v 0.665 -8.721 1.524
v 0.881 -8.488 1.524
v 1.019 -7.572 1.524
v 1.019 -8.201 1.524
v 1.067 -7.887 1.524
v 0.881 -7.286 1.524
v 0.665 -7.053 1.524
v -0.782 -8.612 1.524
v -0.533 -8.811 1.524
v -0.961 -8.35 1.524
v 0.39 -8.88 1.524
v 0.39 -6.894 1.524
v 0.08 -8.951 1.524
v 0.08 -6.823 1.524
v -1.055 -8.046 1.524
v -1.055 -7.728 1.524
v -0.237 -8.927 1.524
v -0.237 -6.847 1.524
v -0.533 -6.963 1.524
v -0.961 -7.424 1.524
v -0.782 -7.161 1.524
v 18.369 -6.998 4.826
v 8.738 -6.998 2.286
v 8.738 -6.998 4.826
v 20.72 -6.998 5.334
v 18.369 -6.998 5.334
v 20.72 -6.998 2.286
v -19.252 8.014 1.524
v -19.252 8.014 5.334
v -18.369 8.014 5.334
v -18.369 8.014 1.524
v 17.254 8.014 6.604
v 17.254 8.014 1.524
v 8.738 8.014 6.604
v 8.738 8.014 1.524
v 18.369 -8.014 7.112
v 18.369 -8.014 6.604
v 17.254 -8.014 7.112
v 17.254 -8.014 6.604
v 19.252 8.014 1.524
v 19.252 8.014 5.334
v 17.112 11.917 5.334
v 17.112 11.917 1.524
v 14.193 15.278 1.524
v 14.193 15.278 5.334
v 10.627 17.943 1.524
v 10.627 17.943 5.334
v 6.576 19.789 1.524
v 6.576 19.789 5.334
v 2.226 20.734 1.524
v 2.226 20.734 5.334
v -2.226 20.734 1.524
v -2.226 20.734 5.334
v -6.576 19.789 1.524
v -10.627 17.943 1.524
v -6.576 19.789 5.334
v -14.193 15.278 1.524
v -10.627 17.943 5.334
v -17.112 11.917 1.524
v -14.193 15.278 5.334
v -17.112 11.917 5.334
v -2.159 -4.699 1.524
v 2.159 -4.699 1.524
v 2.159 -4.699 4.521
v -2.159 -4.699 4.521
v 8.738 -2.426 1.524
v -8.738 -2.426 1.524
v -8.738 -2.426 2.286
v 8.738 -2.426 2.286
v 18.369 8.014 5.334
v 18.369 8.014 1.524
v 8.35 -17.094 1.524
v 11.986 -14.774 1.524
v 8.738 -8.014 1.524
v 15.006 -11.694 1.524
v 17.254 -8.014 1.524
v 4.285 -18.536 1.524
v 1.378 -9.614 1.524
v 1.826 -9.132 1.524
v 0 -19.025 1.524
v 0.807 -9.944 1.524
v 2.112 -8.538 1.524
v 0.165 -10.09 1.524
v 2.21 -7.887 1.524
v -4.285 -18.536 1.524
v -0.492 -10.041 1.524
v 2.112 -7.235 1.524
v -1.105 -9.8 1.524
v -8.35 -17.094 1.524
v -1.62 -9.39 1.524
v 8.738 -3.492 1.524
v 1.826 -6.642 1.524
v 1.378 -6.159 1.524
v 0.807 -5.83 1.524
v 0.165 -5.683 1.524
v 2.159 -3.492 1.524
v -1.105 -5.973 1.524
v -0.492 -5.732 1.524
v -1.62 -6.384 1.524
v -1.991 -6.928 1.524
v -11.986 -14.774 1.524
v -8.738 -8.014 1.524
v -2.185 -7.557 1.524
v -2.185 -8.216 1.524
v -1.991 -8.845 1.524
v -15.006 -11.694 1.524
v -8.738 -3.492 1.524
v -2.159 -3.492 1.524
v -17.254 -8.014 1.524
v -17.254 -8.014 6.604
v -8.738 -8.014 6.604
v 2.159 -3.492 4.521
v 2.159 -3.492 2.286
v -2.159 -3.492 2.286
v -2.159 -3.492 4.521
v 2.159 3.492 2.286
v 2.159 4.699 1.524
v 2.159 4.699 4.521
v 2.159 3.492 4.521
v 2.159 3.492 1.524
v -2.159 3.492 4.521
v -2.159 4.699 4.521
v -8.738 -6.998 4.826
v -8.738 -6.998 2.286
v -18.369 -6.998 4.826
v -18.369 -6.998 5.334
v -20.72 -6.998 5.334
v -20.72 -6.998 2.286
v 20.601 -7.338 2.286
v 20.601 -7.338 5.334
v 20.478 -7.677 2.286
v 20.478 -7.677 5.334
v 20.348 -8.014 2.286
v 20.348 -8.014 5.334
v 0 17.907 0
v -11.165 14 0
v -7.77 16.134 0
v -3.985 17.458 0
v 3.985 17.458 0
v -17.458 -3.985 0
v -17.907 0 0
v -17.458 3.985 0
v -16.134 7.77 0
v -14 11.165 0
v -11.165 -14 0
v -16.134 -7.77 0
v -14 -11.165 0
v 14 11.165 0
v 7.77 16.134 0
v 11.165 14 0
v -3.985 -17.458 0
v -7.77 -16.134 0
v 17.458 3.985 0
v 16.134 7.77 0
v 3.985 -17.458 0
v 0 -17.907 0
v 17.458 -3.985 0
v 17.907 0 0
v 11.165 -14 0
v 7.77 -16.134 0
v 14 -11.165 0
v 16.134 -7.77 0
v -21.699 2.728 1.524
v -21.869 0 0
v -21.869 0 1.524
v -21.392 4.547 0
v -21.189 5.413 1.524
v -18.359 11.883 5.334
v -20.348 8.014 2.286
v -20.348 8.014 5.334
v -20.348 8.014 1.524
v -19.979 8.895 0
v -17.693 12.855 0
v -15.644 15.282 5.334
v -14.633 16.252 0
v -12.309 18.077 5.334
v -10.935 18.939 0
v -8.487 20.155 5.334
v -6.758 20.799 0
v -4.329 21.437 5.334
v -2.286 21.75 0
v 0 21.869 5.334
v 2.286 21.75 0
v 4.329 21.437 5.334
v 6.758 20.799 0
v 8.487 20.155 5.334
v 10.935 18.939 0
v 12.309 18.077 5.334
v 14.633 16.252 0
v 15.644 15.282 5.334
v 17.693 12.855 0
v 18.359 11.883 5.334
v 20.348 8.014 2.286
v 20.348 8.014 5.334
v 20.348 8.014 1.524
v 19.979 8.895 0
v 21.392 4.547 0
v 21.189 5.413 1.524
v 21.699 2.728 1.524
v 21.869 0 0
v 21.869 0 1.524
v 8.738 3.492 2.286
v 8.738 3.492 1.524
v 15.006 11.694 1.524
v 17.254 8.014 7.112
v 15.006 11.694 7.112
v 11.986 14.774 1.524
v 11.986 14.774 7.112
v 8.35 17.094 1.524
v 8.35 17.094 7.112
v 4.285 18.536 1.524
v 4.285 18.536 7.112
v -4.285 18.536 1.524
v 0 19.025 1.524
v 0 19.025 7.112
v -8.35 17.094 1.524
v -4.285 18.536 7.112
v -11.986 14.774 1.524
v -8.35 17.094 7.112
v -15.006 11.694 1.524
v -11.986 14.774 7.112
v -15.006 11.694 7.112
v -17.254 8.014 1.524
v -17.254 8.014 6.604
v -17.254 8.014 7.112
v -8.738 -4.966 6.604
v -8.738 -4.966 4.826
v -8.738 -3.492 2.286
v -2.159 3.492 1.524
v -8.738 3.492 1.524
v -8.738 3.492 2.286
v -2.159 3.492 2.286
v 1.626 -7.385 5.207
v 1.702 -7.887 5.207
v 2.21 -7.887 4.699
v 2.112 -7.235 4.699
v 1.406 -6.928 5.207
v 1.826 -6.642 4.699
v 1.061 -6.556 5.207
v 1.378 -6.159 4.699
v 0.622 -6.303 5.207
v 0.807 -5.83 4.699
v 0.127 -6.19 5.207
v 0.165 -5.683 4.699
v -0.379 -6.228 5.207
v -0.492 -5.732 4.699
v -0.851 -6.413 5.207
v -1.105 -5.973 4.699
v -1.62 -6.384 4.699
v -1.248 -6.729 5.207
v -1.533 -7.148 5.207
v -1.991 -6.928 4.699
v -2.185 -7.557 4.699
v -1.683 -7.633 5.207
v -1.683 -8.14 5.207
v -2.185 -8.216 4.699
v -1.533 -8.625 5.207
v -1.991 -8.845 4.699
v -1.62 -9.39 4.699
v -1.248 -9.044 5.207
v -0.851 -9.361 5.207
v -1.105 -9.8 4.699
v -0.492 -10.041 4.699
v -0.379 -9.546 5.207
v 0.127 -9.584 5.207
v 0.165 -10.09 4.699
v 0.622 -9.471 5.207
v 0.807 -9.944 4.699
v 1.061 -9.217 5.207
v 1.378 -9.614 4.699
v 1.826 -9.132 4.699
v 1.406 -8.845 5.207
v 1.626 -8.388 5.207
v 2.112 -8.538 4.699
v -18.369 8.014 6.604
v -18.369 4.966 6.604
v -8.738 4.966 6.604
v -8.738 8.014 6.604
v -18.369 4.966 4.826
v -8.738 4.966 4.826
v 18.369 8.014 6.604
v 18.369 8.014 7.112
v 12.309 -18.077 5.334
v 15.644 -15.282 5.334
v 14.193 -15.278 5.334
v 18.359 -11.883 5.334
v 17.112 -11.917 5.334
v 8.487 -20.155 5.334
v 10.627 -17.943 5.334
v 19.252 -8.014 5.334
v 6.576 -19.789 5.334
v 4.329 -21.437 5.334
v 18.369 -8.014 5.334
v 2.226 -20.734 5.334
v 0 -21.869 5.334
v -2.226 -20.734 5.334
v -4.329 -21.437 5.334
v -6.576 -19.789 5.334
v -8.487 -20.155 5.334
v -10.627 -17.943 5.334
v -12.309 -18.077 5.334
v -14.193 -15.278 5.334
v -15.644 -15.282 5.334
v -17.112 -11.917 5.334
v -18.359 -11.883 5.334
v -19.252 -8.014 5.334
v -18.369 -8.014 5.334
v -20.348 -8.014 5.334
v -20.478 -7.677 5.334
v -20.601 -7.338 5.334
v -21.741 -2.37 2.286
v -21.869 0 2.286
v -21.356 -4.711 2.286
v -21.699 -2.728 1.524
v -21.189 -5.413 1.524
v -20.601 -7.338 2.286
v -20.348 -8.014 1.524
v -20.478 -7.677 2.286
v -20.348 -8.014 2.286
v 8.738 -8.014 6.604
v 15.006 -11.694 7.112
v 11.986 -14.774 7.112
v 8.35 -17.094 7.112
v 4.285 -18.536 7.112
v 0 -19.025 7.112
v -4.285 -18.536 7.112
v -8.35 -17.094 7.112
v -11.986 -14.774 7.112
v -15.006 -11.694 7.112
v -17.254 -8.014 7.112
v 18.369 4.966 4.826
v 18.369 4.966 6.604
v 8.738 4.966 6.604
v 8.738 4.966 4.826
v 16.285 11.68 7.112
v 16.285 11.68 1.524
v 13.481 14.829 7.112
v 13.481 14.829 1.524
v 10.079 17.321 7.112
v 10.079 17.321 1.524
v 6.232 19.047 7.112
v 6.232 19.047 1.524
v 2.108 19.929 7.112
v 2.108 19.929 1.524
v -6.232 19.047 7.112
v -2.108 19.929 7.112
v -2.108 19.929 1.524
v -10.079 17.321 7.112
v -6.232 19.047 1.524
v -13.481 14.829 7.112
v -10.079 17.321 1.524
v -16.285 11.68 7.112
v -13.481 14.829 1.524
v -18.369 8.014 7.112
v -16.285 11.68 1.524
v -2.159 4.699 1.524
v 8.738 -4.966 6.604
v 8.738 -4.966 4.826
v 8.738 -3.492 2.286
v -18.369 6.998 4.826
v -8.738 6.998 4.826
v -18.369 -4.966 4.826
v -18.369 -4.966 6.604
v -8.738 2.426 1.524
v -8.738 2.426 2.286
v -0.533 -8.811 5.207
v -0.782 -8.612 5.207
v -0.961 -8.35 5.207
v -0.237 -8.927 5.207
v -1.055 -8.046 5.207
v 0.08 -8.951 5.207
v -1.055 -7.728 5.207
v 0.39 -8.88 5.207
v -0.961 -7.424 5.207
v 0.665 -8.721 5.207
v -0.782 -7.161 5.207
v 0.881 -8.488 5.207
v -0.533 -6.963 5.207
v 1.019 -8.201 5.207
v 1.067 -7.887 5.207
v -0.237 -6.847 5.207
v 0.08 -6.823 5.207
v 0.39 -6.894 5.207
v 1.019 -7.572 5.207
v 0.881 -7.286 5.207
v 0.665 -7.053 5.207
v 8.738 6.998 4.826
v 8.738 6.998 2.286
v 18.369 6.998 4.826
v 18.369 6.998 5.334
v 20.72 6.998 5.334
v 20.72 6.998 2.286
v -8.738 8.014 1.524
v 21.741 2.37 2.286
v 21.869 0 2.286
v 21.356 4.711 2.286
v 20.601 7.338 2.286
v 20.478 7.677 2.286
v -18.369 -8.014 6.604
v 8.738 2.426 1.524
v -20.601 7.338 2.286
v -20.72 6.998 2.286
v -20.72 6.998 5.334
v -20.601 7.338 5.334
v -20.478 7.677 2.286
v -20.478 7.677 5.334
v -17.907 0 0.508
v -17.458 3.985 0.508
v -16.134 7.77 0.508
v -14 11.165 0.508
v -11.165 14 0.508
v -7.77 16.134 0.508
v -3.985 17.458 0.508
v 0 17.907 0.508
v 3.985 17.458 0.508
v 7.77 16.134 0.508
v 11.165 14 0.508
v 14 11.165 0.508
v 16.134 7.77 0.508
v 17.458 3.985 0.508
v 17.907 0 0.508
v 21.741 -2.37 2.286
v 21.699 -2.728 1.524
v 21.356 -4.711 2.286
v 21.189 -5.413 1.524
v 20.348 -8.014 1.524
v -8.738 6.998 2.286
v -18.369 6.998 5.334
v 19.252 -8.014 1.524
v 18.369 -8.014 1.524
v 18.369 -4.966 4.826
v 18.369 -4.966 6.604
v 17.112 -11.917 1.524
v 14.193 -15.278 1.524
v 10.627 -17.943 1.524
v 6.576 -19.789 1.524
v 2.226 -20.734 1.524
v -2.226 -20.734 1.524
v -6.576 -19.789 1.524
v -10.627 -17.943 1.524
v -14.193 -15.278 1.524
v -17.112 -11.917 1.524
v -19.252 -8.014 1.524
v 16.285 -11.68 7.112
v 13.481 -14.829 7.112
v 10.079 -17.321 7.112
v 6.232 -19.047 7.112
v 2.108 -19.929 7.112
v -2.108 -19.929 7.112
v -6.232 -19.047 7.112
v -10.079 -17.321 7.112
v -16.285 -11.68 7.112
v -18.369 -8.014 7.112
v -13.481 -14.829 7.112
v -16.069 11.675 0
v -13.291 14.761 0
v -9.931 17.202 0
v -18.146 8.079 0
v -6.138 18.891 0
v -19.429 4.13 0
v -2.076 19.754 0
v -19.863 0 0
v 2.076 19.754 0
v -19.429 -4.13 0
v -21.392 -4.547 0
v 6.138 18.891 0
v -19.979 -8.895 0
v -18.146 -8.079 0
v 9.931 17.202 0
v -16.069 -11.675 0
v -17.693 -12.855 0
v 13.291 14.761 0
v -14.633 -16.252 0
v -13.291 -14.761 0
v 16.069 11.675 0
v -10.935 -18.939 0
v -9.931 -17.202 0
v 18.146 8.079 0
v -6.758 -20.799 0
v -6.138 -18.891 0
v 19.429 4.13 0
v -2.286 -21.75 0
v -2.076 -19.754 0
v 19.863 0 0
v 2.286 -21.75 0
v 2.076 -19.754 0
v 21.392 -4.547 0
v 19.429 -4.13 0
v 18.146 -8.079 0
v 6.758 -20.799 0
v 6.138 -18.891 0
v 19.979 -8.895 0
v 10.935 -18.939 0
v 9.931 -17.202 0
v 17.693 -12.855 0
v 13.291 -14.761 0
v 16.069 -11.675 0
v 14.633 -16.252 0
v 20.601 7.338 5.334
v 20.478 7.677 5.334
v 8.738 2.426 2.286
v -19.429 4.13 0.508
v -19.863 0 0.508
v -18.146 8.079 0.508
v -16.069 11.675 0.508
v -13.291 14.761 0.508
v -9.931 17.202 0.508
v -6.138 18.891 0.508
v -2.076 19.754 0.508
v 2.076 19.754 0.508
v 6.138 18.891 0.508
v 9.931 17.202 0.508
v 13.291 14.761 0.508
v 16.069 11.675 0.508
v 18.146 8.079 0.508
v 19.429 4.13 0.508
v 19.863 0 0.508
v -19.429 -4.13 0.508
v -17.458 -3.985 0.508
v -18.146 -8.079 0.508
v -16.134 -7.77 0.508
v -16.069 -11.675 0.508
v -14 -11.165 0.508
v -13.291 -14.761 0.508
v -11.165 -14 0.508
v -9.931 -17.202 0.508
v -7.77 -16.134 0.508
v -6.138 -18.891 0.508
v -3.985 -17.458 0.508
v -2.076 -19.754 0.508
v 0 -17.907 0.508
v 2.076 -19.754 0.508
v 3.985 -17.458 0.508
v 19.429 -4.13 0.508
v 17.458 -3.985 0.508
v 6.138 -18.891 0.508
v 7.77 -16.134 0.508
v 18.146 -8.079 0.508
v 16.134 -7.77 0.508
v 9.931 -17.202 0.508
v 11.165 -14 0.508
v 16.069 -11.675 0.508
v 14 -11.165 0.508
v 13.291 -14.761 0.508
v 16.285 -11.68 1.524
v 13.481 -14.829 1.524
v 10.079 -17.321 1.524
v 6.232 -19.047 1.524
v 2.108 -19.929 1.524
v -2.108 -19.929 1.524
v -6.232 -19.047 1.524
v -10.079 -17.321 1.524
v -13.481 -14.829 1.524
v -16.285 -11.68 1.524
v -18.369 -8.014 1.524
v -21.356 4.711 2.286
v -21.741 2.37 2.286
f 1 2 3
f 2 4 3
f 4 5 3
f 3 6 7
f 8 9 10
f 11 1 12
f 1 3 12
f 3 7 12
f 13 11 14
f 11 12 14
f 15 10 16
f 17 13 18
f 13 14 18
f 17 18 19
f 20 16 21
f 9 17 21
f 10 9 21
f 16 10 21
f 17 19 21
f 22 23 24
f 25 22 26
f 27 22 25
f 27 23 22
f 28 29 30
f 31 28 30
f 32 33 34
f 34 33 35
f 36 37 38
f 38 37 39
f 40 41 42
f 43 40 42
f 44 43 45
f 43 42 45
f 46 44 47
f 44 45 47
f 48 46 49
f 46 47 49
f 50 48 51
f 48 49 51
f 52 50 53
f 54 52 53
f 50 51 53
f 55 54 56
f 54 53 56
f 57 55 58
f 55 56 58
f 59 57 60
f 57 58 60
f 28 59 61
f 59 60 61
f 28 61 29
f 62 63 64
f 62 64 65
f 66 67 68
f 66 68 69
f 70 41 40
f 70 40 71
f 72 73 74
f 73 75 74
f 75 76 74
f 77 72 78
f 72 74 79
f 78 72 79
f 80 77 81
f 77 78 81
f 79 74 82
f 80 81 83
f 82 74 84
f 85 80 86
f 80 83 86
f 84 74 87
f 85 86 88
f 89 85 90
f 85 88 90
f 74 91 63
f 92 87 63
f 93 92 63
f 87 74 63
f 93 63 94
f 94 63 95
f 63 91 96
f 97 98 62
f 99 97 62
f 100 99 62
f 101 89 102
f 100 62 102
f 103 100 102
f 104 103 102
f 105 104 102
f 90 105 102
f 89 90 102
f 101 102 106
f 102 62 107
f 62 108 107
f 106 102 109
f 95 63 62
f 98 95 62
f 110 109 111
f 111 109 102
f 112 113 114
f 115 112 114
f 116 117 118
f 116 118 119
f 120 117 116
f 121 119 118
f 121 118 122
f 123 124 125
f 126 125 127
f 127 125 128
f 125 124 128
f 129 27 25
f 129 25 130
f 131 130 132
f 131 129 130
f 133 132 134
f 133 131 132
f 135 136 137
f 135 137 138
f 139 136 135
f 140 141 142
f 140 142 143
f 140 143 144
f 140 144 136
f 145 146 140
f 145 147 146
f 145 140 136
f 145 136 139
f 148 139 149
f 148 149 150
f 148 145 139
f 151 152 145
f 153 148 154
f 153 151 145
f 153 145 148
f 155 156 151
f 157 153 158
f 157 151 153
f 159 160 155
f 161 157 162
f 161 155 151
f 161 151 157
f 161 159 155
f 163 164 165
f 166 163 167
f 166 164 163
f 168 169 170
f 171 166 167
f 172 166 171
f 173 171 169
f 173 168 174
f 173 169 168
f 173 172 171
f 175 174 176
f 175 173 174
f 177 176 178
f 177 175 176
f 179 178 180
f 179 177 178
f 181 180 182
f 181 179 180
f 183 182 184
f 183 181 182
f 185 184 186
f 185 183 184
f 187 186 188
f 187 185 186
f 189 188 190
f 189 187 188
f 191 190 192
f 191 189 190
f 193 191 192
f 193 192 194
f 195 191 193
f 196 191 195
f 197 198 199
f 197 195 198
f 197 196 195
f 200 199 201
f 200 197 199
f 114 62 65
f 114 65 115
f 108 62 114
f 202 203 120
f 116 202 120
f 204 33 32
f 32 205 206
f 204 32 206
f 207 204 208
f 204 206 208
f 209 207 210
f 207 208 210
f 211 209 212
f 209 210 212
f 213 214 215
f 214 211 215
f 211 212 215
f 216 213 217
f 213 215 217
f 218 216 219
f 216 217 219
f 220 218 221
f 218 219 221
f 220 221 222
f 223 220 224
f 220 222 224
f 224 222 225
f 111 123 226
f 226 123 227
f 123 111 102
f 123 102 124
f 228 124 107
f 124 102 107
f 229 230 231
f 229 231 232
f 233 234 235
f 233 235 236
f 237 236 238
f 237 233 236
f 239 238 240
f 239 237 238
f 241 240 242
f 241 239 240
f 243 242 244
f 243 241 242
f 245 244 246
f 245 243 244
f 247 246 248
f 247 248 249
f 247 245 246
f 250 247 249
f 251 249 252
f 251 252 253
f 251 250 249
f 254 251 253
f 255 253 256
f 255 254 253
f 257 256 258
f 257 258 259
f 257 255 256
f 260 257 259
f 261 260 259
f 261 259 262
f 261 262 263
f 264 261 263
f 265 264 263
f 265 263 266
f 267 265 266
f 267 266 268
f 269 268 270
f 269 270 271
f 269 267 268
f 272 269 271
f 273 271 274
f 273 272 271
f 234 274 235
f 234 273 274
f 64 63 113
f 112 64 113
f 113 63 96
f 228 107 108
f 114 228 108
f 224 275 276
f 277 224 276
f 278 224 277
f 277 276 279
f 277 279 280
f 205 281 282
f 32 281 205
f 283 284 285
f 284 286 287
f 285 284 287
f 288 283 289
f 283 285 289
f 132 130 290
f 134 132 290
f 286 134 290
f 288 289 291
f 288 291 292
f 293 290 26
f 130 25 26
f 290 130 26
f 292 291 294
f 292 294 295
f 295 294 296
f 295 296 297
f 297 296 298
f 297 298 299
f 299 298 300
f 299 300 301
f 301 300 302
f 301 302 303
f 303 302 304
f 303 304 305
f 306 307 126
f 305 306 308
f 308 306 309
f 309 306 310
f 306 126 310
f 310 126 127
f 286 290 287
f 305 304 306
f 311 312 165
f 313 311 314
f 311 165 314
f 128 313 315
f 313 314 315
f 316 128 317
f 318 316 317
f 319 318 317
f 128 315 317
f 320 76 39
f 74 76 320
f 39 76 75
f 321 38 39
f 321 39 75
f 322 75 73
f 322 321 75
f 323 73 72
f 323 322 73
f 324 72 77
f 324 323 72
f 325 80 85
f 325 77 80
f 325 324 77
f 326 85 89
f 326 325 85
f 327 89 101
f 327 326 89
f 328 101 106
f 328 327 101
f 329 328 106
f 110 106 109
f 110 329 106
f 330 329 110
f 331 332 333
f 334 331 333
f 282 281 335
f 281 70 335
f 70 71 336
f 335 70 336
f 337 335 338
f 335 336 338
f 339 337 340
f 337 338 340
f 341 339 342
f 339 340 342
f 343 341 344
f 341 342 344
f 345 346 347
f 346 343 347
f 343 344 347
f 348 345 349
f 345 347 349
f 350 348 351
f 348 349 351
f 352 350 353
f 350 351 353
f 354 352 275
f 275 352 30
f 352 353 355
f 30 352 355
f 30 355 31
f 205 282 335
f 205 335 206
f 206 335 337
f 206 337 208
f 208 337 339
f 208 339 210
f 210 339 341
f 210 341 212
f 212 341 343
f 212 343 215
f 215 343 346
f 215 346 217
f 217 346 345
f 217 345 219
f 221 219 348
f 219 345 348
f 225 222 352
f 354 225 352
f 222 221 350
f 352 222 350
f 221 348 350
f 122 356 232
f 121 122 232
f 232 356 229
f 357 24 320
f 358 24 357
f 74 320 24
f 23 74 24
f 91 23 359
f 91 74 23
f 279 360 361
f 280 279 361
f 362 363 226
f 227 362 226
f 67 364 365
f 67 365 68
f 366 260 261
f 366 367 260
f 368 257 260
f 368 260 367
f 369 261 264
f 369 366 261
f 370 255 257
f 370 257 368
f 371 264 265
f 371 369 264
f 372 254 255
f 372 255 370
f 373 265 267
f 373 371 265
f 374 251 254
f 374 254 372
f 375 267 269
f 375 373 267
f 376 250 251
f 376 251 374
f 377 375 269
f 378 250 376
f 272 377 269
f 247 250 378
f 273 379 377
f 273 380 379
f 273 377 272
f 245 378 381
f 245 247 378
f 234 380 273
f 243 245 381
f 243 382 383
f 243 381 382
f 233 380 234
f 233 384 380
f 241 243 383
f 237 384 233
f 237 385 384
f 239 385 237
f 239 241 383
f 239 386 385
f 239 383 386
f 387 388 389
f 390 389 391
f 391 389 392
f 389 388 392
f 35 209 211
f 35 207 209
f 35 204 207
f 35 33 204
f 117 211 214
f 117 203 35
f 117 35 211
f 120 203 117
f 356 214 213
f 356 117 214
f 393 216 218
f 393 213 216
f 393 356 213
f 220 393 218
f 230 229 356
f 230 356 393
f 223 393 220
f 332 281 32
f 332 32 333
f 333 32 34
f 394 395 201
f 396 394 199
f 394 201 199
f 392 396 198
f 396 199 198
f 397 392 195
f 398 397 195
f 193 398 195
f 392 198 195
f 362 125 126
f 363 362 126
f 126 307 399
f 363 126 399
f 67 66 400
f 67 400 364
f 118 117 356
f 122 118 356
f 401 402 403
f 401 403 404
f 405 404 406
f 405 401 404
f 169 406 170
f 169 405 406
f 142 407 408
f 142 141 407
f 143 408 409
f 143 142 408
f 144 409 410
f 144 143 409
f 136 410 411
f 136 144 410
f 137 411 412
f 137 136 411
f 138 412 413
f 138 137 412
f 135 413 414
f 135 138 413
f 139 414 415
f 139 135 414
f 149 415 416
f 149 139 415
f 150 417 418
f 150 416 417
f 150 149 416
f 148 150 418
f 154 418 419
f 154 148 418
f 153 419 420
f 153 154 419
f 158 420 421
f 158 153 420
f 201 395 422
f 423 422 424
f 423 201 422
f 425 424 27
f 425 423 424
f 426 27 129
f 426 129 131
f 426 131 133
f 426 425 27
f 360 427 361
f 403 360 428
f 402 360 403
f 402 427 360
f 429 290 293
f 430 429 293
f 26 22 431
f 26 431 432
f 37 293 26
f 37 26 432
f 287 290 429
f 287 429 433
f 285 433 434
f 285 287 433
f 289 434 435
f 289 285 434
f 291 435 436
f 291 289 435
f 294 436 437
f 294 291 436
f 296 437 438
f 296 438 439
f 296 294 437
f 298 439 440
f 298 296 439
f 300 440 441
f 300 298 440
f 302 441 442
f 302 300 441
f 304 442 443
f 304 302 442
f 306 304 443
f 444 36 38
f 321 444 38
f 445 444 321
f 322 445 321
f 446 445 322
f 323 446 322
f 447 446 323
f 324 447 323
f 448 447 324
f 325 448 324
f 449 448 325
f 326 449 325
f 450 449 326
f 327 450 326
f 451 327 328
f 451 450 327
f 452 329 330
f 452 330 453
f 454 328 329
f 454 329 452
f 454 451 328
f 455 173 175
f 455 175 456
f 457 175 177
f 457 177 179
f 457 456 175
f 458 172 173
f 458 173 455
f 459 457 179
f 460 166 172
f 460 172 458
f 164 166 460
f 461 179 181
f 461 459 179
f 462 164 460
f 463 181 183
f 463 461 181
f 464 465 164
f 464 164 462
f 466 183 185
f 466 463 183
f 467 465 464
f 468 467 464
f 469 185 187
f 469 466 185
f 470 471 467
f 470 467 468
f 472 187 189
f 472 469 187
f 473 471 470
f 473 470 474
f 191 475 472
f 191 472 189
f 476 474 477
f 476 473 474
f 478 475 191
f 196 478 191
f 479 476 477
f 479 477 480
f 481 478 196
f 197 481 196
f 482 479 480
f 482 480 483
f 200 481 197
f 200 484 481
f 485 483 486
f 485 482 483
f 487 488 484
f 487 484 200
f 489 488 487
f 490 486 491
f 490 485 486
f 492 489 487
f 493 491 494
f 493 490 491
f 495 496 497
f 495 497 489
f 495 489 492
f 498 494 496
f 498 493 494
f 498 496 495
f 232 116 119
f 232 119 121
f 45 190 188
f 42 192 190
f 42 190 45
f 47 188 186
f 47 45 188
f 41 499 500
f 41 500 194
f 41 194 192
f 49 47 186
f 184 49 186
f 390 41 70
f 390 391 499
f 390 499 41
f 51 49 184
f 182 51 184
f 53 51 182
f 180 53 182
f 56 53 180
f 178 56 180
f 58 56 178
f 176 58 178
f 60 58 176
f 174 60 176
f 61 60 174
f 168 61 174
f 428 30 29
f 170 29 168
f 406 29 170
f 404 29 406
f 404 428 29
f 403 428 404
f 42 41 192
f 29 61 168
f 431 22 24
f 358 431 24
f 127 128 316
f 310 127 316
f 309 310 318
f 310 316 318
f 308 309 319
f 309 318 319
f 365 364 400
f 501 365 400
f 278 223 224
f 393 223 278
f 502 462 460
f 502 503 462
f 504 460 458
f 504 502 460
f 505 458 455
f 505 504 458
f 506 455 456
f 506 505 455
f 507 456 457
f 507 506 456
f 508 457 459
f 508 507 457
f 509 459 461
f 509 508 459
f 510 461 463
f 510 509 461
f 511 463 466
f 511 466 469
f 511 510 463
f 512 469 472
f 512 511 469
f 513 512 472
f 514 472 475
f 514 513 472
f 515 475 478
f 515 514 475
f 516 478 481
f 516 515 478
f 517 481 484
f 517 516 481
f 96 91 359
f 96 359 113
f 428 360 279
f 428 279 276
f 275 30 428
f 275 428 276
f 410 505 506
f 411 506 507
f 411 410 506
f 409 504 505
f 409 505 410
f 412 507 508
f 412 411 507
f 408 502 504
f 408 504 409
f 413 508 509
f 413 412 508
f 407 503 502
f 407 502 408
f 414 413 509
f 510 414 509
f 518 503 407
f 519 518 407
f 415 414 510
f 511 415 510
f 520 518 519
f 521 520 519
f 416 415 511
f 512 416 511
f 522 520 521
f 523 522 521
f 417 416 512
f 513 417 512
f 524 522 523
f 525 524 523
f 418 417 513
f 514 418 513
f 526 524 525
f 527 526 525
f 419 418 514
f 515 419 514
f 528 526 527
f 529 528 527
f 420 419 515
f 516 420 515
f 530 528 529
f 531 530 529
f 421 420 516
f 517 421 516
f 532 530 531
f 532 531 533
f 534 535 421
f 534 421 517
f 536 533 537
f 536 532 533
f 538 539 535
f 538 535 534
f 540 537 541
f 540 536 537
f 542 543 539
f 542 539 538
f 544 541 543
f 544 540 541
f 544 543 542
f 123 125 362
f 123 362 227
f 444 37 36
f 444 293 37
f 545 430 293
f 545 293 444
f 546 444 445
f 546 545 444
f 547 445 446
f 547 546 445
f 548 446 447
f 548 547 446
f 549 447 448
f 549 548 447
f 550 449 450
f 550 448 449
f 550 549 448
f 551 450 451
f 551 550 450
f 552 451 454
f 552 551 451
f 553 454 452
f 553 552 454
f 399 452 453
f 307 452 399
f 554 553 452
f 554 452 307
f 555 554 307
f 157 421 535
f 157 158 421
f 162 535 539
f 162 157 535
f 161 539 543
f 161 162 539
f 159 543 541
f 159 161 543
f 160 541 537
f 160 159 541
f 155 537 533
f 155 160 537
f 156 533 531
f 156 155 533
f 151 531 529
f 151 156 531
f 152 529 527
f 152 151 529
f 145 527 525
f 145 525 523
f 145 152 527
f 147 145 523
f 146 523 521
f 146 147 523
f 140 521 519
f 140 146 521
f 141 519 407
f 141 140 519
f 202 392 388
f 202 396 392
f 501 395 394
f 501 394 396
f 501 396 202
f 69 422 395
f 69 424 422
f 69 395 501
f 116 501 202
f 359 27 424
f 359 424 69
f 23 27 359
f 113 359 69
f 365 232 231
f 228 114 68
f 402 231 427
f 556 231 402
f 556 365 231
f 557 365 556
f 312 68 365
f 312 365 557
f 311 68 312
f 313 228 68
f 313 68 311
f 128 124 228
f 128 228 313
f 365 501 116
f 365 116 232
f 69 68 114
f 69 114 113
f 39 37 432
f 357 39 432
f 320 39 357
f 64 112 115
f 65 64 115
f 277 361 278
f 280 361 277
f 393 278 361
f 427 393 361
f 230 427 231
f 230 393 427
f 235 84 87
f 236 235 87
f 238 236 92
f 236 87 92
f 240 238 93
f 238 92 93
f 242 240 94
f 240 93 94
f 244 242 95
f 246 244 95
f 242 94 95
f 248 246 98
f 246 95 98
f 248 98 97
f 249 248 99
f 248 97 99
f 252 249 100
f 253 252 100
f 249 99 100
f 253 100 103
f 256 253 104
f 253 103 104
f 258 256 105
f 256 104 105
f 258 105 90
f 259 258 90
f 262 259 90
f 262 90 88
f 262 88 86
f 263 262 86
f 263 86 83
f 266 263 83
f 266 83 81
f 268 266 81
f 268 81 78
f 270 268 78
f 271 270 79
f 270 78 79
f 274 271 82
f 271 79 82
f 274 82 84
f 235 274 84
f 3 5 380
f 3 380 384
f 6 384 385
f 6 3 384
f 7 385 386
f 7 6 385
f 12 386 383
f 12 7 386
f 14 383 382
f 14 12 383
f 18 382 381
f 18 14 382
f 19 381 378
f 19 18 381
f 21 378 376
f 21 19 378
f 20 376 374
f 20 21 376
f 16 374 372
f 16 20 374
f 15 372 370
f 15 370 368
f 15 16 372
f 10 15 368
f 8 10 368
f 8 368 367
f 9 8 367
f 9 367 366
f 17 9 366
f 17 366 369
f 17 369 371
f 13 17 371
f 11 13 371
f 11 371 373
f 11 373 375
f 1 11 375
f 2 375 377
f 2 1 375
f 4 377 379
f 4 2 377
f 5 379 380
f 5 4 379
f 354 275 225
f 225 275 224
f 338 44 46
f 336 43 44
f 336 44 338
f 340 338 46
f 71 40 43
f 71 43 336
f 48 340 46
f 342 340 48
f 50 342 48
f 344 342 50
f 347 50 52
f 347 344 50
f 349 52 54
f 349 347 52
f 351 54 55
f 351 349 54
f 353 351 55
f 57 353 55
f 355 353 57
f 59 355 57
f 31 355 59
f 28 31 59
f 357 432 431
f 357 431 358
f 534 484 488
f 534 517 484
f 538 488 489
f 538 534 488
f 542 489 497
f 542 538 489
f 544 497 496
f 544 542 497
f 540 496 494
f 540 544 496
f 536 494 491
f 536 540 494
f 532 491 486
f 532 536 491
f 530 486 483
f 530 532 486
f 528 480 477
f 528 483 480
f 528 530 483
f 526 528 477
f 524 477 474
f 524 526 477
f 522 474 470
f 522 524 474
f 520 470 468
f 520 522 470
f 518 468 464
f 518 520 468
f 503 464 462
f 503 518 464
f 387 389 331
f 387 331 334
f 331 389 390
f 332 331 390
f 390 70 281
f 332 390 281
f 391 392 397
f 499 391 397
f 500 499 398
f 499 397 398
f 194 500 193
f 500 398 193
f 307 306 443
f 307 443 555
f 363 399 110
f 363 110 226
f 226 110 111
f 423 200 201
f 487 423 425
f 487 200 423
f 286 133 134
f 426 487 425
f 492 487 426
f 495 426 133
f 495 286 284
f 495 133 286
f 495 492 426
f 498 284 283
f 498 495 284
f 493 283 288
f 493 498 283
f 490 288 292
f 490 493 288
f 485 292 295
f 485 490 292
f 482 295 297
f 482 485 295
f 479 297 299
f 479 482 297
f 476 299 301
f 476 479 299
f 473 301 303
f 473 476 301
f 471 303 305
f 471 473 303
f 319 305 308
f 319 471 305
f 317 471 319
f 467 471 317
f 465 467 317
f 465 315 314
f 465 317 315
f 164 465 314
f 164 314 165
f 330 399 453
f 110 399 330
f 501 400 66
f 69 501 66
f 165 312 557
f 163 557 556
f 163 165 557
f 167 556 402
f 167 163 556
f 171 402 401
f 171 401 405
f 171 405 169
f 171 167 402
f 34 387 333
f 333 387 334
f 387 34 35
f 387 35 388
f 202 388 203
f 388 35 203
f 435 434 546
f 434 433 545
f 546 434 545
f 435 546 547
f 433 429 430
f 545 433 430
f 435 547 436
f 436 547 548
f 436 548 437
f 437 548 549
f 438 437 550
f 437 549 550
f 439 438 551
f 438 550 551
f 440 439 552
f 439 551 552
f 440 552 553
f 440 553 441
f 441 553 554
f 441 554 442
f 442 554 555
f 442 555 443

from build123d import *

# Parameters (mm, degrees)
F1_ANGLE  = 90
F3_DEPTH  = 25.4
F4_DEPTH  = 0.762
F6_DEPTH  = 3.048
F7_W      = 9.631022
F7_H      = 1.778
F8_DEPTH  = 3.048
F9_W      = 2.159
F9_H      = 1.2065
F10_DEPTH = 2.9972
F13_R     = 2.2098
F13_R_2   = 1.0668
F14_DEPTH = 3.683
F15_SIZE  = 0.508


with BuildPart() as f1:
    # F0 (on Front) → F1 (revolve)
    with BuildSketch(Plane.XZ):
        Polygon((-17.907, 0), (0, 0), (0, 1.524), (-19.0246, 1.524), (-19.0246, 7.112), (-20.0406, 7.112), (-20.0406, 1.524), (-20.8534, 1.524), (-20.8534, 5.334), (-21.8694, 5.334), (-21.8694, 0), (-19.8628, 0), (-19.8628, 0.508), (-17.907, 0.508), align=None)
    revolve(axis=Axis((0, 0, 5.251978), (0, 0, 1)), revolution_arc=F1_ANGLE)

    # F2 (on face) → F3 (cut)
    with BuildSketch(Plane.XY.offset(1.524)):
        with BuildLine():
            Line((0, -3.4925), (0, -2.4257))
            Line((0, -2.4257), (-8.7376, -2.4257))
            Line((-8.7376, -2.4257), (-8.7376, 0))
            Line((-8.7376, 0), (-21.8694, 0))
            ThreePointArc((-21.8694, 0), (-21.485747, -4.078397), (-20.34825, -8.0137))
            Line((-20.34825, -8.0137), (-8.7376, -8.0137))
            Line((-8.7376, -8.0137), (-8.7376, -3.4925))
            Line((-8.7376, -3.4925), (0, -3.4925))
        make_face()
    extrude(amount=F3_DEPTH, mode=Mode.SUBTRACT)

    # F2 (on face) → F4 (join)
    with BuildSketch(Plane.XY.offset(1.524)):
        with BuildLine():
            Line((0, -3.4925), (0, -2.4257))
            Line((0, -2.4257), (-8.7376, -2.4257))
            Line((-8.7376, -2.4257), (-8.7376, 0))
            Line((-8.7376, 0), (-21.8694, 0))
            ThreePointArc((-21.8694, 0), (-21.485747, -4.078397), (-20.34825, -8.0137))
            Line((-20.34825, -8.0137), (-8.7376, -8.0137))
            Line((-8.7376, -8.0137), (-8.7376, -3.4925))
            Line((-8.7376, -3.4925), (0, -3.4925))
        make_face()
    extrude(amount=F4_DEPTH)

    # F5 (on face) → F6 (join, through all)
    with BuildSketch(Plane.XY.offset(2.286)):
        with BuildLine():
            Line((-20.34825, -8.0137), (-8.7376, -8.0137))
            Line((-8.7376, -8.0137), (-8.7376, -6.9977))
            Line((-8.7376, -6.9977), (-20.719625, -6.9977))
            ThreePointArc((-20.719625, -6.9977), (-20.54022, -7.507997), (-20.34825, -8.0137))
        make_face()
    extrude(amount=F6_DEPTH)

    # F7 (on face) → F8 (join)
    with BuildSketch(Plane.XZ.offset(8.0137)):
        with Locations((-13.553111, 5.715)):
            Rectangle(F7_W, F7_H)
    extrude(amount=-F8_DEPTH)

    # F9 (on face) → F10 (join)
    with BuildSketch(Plane.XY.offset(1.524)):
        with Locations((-1.0795, -4.09575)):
            Rectangle(F9_W, F9_H)
    extrude(amount=F10_DEPTH)

    # F11: F1 across face


with BuildPart() as f1_1:
    add(f1.part)
    add(f1.part.mirror(Plane(origin=(0, -12.015662, 1.628309), x_dir=(0, 1, 0), z_dir=(1, 0, 0))))

    # F12: F1 across face


with BuildPart() as f1_2:
    add(f1_1.part)
    add(f1_1.part.mirror(Plane(origin=(0, 0, 1.044039), x_dir=(-1, 0, 0), z_dir=(0, 1, 0))))

    # F13 (on face) → F14 (join)
    with BuildSketch(Plane.XY.offset(1.524)):
        with Locations((0, -7.8867)):
            Circle(F13_R)
        with Locations((0, -7.8867)):
            Circle(F13_R_2, mode=Mode.SUBTRACT)
    extrude(amount=F14_DEPTH)

    # F15
    f15_edges = [f1_2.edges().sort_by_distance(p)[0] for p in [
        (-2.2098, -7.8867, 5.207),
    ]]
    chamfer(f15_edges, length=F15_SIZE)


solid = f1_2.part
